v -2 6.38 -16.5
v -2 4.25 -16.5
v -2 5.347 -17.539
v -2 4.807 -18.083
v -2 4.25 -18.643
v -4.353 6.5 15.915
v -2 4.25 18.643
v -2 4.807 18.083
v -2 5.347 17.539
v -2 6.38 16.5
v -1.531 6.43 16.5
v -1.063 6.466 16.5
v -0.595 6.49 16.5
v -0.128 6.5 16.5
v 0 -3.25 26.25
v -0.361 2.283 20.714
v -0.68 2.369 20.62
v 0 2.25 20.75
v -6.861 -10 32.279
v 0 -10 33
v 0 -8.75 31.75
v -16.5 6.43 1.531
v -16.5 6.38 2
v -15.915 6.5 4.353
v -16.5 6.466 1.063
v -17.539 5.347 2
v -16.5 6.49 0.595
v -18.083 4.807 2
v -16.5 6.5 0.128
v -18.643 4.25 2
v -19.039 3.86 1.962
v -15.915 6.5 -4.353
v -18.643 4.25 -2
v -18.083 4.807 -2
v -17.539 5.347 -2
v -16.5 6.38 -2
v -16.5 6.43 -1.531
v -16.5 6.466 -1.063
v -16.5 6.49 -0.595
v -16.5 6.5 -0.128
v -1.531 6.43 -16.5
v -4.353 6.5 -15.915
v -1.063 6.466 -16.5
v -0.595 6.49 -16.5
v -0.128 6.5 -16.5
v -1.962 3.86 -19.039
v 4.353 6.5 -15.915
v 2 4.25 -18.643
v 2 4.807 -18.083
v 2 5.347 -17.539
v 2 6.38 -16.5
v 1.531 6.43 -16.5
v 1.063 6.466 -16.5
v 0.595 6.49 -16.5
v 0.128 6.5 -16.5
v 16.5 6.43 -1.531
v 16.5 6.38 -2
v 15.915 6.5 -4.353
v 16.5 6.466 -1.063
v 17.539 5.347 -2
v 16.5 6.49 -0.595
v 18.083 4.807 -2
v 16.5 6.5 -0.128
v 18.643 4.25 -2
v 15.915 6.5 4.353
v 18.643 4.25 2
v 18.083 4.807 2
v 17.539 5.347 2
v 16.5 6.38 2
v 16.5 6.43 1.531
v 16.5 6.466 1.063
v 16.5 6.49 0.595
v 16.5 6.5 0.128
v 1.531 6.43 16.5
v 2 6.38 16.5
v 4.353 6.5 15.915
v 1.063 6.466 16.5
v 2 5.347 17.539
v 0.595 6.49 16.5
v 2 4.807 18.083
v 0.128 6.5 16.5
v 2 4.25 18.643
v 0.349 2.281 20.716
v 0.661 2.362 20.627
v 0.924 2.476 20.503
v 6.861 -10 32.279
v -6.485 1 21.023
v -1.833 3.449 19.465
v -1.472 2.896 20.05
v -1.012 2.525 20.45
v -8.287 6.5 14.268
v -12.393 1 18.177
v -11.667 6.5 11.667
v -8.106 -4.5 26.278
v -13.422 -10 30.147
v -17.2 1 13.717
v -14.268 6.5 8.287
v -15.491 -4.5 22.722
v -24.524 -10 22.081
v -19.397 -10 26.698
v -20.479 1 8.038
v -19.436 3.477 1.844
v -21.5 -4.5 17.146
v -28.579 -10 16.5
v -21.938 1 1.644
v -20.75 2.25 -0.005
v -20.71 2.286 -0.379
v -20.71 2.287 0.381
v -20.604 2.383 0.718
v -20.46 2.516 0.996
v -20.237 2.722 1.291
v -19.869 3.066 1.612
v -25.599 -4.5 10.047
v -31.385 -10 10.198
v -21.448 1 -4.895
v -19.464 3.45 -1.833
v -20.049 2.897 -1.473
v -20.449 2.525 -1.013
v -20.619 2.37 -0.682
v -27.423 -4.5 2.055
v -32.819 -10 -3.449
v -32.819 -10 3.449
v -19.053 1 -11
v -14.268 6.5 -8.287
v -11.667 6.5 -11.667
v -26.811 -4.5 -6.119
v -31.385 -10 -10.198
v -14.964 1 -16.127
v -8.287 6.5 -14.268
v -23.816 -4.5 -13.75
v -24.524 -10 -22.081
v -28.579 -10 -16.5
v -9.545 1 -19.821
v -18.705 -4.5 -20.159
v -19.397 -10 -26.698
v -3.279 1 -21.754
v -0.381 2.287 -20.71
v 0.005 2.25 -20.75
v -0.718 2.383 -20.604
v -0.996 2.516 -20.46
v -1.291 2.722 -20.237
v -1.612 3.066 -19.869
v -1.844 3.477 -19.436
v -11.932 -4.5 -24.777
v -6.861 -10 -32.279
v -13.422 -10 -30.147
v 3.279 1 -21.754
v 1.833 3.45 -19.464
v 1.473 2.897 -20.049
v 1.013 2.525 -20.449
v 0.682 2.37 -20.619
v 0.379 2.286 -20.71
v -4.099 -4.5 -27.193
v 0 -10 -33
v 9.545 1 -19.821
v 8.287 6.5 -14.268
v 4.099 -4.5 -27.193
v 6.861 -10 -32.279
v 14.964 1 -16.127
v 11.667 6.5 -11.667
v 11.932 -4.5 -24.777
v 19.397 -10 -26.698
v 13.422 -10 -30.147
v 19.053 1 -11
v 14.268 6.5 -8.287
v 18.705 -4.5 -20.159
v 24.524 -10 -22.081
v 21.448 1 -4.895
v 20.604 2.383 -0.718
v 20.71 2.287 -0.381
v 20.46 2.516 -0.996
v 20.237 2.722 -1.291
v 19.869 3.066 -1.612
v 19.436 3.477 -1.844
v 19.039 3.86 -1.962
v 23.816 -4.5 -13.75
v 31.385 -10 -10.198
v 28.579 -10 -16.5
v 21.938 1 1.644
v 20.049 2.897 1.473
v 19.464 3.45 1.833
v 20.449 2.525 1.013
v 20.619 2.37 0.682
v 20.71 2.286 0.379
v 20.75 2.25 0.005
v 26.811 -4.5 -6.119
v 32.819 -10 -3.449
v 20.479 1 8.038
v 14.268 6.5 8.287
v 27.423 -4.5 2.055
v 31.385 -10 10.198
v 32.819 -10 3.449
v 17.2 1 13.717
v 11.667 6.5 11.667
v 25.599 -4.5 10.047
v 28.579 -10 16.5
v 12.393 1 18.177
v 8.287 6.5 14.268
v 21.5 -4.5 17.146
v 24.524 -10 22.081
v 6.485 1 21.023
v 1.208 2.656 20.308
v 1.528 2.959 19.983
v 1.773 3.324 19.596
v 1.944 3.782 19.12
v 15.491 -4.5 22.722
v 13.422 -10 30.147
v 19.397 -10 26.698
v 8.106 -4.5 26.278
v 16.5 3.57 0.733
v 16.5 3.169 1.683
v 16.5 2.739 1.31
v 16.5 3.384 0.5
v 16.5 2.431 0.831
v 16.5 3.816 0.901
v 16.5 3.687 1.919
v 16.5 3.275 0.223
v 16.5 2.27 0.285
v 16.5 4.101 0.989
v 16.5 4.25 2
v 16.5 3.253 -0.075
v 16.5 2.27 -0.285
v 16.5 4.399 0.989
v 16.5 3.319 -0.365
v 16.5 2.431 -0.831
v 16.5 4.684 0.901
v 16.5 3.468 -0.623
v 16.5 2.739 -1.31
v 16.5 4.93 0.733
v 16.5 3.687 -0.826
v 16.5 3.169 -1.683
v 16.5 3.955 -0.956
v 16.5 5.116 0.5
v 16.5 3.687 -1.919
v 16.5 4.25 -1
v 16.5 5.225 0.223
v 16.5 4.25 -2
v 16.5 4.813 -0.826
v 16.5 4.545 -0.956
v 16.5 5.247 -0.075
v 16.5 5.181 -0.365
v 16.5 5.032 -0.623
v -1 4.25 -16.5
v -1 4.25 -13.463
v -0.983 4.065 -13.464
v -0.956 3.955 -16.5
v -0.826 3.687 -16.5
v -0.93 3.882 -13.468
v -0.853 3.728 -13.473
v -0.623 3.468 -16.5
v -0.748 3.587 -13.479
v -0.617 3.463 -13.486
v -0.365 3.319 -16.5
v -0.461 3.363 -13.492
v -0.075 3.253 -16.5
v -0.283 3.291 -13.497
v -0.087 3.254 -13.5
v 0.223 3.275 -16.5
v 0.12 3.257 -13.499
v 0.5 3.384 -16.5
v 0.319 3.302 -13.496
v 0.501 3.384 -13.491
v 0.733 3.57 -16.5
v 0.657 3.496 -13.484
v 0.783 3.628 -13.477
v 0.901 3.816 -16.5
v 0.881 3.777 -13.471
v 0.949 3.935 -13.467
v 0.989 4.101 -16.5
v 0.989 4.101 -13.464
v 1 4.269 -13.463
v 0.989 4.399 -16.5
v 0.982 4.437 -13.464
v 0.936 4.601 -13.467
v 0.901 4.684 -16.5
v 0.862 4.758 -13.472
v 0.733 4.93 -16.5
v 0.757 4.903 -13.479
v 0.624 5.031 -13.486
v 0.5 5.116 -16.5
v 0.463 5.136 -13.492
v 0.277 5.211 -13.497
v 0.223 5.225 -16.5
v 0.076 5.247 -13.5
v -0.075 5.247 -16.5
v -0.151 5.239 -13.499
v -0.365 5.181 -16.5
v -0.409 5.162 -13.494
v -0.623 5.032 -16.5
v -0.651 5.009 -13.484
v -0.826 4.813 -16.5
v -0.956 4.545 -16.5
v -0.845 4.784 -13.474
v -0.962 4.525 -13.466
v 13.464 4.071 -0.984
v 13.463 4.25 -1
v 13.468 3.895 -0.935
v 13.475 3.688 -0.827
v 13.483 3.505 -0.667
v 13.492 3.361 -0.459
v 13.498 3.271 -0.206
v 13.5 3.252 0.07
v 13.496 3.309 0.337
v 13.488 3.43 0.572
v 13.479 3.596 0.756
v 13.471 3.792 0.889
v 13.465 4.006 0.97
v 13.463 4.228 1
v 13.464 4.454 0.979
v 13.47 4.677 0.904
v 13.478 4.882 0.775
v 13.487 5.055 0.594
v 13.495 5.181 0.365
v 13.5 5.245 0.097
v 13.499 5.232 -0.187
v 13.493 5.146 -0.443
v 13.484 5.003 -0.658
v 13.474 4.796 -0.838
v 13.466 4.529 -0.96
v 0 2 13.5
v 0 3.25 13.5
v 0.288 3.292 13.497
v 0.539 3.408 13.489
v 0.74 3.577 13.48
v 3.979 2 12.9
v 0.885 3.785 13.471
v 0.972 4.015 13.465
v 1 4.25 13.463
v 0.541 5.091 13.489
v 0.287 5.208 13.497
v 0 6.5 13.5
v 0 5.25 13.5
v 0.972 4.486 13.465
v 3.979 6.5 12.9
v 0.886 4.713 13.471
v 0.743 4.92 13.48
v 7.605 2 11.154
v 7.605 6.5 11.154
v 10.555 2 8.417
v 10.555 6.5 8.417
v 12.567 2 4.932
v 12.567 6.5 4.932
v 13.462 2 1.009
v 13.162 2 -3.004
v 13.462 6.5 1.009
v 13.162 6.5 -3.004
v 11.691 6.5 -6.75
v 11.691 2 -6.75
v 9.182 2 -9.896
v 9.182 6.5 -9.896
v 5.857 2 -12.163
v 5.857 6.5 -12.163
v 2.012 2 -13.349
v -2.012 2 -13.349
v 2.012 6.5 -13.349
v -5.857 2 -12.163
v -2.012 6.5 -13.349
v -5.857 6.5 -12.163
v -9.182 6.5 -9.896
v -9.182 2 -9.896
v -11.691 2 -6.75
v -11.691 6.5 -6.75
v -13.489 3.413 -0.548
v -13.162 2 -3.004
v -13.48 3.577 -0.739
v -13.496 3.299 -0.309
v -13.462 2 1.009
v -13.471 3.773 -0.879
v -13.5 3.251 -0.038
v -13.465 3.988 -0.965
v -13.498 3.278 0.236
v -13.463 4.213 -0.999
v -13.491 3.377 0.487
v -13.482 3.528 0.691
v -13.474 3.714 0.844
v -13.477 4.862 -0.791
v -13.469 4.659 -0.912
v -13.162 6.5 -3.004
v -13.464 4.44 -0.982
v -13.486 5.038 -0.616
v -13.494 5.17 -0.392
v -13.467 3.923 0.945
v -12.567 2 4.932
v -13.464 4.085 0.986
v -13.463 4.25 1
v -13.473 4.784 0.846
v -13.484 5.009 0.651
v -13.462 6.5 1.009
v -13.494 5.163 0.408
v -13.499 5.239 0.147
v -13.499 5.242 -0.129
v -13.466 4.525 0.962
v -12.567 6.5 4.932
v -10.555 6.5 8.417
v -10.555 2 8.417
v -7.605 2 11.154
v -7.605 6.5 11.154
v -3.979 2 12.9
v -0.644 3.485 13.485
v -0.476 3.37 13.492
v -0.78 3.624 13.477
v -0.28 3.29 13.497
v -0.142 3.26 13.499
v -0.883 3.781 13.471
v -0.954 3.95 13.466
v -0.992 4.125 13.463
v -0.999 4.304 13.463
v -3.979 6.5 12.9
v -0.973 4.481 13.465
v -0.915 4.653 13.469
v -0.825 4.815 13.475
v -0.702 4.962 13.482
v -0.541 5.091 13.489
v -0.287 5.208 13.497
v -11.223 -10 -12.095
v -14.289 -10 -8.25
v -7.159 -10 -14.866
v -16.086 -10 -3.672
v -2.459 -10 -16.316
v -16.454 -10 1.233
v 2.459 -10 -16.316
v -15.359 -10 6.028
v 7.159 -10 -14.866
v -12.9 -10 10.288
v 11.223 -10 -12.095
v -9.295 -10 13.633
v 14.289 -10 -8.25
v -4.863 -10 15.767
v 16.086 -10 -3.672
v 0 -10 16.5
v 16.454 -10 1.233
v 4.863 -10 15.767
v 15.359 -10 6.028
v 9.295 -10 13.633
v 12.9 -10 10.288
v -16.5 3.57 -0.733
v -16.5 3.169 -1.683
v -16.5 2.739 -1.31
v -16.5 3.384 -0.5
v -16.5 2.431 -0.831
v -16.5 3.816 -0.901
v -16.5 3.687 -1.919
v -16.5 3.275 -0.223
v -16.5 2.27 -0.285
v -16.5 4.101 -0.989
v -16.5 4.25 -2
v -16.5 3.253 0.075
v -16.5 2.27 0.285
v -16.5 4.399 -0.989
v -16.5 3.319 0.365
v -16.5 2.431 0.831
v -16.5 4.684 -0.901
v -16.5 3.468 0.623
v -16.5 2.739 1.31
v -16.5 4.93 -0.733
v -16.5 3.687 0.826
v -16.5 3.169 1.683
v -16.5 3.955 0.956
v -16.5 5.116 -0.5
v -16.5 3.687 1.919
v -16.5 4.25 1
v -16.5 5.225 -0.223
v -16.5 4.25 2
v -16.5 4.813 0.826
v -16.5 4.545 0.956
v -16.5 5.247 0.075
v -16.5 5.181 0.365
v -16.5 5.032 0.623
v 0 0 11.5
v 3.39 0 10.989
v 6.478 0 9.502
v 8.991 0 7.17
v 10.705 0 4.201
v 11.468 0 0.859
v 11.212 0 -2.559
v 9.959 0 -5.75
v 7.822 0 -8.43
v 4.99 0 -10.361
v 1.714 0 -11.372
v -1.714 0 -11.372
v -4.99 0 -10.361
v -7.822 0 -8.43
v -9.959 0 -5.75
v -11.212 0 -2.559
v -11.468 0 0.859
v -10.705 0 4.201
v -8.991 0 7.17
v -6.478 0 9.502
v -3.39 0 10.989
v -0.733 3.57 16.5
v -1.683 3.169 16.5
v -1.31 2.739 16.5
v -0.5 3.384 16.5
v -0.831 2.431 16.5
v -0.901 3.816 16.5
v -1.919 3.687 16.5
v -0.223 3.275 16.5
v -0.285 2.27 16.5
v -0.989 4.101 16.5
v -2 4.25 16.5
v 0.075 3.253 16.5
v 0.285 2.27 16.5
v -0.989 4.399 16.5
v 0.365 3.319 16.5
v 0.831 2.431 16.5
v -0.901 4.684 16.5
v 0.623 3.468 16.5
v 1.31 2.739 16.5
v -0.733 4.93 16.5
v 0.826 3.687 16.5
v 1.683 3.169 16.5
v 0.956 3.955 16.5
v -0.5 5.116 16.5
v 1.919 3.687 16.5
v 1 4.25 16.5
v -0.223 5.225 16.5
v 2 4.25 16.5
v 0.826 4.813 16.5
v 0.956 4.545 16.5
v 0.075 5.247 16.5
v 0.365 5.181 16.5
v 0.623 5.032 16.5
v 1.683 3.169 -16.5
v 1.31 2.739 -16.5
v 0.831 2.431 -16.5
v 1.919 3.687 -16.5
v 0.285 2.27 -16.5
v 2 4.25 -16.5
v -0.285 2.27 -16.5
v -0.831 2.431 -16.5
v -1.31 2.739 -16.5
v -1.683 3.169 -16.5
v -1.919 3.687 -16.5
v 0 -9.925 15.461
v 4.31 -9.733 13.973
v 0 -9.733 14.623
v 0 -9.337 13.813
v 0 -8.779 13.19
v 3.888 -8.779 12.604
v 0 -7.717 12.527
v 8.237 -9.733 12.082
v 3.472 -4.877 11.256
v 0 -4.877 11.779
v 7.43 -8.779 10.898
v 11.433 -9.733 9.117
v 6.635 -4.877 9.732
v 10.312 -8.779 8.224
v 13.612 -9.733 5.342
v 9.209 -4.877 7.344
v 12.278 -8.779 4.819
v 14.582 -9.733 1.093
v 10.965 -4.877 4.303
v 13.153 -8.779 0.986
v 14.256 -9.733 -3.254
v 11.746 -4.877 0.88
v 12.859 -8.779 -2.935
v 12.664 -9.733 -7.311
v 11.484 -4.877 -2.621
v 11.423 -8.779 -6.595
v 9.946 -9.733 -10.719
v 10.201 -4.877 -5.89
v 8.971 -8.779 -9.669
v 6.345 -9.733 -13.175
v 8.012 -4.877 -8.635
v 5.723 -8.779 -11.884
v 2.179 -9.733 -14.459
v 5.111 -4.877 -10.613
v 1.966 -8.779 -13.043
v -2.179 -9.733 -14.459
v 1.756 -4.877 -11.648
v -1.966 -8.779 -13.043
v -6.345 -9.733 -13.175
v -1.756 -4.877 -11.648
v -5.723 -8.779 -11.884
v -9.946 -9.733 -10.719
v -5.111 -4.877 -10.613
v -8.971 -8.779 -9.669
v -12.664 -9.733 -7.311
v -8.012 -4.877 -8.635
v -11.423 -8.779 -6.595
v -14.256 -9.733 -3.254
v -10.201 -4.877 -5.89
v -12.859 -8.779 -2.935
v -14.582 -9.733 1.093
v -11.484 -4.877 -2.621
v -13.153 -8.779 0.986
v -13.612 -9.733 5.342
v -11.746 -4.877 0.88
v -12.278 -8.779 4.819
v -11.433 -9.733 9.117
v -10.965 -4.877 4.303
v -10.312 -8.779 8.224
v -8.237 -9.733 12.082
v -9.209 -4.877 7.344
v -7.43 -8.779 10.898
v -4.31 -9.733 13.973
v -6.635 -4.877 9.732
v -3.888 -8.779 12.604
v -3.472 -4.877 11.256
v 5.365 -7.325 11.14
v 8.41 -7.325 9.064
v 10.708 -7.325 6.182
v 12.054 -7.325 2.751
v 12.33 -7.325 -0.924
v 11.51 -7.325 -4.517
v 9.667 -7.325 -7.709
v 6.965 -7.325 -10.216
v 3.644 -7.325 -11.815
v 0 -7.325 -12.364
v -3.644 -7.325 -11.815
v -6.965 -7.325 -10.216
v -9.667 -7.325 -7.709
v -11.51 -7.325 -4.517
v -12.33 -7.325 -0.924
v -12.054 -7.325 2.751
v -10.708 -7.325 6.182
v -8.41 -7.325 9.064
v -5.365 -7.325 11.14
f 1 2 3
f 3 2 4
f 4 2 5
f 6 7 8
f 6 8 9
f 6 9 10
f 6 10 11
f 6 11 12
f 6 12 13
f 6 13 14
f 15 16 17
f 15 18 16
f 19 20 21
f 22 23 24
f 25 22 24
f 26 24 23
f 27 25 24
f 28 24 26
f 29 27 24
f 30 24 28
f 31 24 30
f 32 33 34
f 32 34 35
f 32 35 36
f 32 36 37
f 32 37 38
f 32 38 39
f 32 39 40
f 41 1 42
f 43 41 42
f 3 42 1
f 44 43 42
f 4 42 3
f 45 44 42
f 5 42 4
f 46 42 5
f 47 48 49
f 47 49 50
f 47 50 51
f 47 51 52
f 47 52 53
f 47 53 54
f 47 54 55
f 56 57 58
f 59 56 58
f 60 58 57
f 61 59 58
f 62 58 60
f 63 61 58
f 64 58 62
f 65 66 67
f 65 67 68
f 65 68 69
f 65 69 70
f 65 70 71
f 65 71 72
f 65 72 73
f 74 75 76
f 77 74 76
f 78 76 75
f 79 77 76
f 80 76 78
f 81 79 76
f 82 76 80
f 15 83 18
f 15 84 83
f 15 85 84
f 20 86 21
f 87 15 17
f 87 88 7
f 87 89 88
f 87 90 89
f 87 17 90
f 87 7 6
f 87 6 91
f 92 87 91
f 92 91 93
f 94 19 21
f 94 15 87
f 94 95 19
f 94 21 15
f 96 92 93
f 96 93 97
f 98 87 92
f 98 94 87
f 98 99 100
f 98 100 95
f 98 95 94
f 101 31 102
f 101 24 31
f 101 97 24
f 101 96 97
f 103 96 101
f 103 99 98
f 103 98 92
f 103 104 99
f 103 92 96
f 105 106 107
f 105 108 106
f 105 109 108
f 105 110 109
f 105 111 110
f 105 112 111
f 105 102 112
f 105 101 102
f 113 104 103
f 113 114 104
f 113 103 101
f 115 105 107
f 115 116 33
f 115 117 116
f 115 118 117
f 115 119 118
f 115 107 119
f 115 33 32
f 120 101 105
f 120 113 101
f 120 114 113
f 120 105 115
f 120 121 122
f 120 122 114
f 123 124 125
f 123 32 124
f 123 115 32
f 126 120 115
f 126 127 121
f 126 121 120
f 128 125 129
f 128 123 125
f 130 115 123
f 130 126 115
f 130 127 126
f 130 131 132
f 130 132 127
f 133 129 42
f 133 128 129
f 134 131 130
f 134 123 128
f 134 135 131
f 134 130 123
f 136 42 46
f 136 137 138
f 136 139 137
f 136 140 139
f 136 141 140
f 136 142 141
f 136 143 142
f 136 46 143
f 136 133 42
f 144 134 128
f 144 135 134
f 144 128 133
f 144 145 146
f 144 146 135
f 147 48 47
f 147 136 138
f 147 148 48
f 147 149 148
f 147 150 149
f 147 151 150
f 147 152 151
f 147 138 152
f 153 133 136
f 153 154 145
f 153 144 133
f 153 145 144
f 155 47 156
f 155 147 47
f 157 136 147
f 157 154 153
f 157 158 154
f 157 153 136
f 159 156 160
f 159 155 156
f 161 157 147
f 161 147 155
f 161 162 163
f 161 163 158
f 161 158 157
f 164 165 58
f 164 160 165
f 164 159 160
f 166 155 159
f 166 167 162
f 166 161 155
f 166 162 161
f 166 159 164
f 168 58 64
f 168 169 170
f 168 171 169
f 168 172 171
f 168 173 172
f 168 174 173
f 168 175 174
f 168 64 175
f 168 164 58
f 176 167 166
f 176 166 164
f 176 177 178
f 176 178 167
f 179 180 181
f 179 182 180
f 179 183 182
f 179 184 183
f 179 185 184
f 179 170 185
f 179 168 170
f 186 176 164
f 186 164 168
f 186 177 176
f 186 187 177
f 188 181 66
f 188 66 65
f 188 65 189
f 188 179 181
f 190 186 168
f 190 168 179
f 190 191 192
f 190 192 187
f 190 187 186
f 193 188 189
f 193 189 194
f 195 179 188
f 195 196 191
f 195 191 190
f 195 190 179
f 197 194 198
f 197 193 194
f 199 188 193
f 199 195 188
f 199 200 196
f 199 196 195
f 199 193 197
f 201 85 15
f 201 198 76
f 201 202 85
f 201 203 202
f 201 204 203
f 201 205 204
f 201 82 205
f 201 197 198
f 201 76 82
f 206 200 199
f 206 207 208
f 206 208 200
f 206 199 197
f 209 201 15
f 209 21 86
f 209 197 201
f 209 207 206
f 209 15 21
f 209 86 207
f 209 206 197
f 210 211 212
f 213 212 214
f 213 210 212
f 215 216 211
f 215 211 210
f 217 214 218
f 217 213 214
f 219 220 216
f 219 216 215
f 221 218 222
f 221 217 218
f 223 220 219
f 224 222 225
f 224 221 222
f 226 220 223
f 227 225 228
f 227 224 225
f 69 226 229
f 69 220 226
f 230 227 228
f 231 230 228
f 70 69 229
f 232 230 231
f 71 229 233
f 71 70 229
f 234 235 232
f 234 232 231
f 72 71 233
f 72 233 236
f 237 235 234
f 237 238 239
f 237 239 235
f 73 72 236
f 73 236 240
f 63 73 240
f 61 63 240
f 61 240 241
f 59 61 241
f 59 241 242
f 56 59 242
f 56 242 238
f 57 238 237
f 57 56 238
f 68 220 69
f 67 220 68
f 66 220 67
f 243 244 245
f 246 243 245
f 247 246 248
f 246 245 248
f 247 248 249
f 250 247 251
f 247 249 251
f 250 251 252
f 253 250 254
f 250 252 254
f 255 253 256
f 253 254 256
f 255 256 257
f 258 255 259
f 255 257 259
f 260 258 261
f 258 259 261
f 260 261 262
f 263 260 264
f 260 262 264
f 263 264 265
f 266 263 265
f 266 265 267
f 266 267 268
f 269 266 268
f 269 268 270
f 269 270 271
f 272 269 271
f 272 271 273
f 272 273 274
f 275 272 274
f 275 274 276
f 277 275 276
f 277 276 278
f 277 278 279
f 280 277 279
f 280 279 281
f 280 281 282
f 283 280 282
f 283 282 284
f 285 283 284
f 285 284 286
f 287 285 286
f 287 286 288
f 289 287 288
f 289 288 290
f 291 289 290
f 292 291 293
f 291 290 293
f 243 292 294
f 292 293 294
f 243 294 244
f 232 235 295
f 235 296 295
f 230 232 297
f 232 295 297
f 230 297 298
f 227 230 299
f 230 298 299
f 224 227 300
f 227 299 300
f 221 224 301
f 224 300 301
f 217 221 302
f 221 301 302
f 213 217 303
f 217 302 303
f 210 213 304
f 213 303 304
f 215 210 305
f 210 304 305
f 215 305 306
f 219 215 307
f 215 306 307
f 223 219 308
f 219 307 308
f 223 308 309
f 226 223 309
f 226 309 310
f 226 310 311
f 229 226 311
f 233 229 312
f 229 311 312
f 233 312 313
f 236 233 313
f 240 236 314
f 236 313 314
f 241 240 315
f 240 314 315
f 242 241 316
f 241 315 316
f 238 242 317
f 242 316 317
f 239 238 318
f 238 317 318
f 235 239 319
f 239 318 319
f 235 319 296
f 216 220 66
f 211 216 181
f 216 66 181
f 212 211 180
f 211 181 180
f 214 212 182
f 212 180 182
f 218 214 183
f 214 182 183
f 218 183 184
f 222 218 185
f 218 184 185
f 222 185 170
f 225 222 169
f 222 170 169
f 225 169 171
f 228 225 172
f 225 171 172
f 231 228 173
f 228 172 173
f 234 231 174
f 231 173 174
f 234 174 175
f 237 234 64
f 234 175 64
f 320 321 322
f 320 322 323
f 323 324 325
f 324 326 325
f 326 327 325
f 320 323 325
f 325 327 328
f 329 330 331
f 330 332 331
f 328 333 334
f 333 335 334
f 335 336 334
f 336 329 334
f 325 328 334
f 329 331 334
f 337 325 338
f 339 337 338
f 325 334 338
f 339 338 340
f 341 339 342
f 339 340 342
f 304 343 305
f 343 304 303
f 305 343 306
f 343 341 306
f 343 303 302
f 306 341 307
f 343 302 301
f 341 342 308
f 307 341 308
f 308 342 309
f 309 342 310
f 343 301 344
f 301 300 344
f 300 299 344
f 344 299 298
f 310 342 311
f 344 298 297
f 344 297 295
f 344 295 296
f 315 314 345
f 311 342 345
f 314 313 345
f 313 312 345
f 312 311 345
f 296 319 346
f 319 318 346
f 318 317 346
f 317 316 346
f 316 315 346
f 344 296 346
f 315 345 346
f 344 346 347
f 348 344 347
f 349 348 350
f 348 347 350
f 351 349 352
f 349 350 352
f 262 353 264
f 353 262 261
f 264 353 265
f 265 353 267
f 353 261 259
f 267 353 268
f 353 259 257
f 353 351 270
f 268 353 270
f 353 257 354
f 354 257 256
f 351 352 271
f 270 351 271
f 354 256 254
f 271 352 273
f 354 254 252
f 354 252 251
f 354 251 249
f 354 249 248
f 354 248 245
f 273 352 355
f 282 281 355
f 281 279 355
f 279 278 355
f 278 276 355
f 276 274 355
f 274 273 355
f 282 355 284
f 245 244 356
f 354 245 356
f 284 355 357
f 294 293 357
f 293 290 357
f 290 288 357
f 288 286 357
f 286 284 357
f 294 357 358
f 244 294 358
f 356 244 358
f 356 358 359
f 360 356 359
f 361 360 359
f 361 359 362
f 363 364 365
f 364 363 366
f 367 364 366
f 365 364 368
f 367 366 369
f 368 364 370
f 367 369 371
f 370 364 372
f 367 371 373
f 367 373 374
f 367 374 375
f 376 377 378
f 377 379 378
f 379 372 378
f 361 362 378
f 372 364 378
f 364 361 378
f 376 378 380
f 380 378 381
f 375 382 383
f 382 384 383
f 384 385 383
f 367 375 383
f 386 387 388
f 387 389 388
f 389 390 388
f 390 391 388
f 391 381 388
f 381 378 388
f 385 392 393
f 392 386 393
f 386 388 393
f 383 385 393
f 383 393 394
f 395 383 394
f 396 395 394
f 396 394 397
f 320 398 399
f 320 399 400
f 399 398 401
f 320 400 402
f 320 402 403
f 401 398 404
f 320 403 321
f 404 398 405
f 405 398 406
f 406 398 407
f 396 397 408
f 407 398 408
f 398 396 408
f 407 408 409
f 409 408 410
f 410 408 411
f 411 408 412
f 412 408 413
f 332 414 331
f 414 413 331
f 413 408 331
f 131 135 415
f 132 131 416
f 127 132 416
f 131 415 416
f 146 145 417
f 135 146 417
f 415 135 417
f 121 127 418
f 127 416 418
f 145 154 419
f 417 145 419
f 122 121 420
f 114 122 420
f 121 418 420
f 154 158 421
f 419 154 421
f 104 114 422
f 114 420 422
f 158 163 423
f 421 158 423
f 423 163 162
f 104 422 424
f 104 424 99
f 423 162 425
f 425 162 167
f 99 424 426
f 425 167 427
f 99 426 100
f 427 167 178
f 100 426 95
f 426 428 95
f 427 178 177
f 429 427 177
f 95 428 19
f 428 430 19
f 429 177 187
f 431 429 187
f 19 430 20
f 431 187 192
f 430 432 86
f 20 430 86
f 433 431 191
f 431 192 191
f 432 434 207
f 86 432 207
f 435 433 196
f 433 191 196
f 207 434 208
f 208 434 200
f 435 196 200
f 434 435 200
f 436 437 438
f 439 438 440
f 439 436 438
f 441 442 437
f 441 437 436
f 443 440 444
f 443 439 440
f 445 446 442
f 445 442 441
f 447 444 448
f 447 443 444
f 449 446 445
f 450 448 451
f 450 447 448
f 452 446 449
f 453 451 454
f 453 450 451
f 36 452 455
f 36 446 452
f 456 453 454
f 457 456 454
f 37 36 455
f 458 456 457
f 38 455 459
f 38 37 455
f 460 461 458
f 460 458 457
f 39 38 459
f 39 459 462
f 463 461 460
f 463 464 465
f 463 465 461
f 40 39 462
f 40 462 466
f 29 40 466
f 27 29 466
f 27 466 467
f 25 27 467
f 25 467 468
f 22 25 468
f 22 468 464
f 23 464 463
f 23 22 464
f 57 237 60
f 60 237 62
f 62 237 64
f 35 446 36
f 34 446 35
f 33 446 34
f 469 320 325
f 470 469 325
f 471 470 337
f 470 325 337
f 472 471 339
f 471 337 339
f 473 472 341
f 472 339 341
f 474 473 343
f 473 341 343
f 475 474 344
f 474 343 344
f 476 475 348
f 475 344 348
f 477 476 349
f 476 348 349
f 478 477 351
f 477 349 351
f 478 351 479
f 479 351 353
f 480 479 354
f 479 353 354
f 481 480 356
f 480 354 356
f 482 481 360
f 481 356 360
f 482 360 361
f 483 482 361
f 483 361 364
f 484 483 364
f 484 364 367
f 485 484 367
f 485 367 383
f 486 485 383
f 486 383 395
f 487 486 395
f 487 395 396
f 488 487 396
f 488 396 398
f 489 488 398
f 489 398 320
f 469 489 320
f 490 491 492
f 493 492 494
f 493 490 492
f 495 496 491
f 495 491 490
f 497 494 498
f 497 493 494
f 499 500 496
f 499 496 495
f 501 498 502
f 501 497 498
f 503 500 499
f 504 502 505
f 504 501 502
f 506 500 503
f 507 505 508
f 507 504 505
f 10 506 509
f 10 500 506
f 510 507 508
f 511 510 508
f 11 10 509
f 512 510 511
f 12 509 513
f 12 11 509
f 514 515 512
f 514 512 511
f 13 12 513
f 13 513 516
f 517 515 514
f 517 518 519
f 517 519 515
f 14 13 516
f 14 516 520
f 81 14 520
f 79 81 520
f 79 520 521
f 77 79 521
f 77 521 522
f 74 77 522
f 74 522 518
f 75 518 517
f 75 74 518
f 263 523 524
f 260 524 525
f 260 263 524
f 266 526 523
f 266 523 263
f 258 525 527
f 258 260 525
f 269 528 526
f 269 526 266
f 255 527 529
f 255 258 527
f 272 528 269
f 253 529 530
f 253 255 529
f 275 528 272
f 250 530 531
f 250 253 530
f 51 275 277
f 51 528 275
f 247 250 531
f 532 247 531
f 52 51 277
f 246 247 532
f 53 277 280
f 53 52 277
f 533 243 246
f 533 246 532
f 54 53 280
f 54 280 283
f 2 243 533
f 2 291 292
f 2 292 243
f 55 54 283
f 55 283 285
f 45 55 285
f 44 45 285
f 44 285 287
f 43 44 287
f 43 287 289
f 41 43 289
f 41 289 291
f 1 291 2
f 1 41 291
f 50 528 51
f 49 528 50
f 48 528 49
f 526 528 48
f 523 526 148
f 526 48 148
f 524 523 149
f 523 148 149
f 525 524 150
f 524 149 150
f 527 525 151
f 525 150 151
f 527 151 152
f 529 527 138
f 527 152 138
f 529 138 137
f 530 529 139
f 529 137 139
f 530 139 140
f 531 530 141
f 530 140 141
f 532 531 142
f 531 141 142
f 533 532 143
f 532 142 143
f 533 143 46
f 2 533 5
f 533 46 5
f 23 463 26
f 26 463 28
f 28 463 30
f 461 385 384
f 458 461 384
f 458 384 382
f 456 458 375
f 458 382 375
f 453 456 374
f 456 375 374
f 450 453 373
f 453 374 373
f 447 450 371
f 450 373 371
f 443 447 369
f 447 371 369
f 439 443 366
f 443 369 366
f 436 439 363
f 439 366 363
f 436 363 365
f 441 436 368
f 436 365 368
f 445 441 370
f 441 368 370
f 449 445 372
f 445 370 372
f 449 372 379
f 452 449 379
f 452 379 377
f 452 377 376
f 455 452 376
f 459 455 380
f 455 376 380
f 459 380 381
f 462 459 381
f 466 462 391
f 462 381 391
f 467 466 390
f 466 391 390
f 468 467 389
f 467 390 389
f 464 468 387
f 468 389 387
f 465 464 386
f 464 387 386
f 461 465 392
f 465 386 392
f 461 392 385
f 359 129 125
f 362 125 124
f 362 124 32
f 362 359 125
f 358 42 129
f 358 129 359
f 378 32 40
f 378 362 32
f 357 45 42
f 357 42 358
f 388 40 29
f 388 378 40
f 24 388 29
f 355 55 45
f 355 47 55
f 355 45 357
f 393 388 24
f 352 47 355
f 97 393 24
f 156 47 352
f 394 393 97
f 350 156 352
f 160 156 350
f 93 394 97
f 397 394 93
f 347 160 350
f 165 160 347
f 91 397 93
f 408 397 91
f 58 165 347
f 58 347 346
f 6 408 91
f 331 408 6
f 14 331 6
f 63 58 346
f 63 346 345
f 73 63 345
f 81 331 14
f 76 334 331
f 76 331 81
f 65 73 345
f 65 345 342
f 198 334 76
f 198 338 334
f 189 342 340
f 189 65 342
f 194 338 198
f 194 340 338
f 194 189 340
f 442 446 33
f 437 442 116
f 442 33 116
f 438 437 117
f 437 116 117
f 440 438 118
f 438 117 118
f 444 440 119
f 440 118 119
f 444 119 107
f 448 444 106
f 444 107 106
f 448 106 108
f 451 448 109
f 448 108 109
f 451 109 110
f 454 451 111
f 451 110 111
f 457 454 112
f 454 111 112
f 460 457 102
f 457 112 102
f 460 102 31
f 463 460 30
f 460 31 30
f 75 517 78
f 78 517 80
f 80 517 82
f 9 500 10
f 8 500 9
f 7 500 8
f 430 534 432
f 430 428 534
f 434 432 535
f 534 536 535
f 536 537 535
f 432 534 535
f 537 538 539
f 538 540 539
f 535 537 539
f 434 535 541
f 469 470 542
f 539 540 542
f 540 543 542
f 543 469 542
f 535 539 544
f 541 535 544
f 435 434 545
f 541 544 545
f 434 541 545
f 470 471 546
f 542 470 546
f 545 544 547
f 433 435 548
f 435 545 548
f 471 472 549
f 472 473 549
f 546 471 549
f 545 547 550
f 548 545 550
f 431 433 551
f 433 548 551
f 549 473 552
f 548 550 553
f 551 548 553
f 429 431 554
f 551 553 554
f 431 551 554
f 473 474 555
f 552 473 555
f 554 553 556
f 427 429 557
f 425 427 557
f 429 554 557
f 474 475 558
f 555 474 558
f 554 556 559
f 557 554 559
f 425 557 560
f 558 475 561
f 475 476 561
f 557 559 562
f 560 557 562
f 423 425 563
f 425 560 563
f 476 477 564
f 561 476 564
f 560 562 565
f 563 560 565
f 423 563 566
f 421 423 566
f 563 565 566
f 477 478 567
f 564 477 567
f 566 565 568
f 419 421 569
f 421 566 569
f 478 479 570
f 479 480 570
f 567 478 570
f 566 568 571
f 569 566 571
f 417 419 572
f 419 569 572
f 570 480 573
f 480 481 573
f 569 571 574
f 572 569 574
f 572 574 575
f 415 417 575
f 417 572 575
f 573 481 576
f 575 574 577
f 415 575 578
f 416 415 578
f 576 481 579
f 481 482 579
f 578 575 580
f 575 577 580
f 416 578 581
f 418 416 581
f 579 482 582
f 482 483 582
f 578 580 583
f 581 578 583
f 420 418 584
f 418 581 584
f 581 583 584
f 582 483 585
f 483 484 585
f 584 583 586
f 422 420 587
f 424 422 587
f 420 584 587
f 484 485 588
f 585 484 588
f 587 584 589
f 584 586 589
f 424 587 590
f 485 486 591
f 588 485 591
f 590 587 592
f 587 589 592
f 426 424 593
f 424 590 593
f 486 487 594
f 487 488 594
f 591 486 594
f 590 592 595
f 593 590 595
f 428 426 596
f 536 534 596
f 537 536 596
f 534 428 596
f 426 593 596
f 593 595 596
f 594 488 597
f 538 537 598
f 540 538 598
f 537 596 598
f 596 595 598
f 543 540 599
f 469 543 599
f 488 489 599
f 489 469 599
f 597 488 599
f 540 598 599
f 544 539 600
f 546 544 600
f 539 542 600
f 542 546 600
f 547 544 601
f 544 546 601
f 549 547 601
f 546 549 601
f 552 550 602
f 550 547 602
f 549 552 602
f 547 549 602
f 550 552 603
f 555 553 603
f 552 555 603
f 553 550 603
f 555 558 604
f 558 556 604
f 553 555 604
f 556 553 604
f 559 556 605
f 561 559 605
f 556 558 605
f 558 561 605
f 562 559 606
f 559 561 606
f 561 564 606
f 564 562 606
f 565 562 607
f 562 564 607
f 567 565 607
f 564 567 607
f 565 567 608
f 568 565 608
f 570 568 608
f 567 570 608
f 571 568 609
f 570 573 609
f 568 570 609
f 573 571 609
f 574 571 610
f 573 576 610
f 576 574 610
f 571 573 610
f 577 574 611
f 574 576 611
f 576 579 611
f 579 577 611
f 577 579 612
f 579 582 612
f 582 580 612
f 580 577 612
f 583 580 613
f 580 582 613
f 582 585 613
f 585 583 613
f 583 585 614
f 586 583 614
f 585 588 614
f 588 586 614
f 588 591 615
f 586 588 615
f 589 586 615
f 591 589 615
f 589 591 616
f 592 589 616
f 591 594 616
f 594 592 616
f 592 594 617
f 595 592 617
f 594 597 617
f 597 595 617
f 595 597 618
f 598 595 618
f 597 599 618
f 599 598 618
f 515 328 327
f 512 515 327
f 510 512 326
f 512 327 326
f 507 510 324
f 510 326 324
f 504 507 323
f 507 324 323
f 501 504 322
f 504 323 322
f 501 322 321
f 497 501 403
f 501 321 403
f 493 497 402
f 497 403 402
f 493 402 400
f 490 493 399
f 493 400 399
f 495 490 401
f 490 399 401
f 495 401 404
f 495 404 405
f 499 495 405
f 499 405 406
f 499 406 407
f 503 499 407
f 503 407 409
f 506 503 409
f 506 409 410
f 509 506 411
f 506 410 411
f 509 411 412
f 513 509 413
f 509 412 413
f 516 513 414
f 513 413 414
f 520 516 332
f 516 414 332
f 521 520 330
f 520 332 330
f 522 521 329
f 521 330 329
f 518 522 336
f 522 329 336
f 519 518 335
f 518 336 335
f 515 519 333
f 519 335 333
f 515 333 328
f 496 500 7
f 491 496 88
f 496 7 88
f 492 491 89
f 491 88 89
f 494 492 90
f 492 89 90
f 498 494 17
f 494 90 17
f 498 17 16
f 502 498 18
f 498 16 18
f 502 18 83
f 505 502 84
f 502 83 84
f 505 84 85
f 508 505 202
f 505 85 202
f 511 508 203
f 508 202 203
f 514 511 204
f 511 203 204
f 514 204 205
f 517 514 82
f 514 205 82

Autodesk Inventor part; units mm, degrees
ref_plane "YZ Plane" through (0, 0, 0) normal (1, 0, 0) x (0, 1, 0)
ref_plane "XZ Plane" through (0, 0, 0) normal (0, 1, 0) x (-1, 0, 0)
sketch "Эскиз1" plane through (0, 0, 0) normal (1, 0, 0) x (0, 1, 0)
  line L0 (0, 0) -> (0, 11.5)
  line L1 (0, 11.5) -> (0, 13.5)
  line L2 (0, 13.5) -> (2, 13.5)
  line L3 (2, 13.5) -> (0, 11.5)
  line L4 (2, 13.5) -> (6.5, 13.5)
  line L5 (6.5, 13.5) -> (6.5, 16.5)
  line L6 (6.5, 16.5) -> (2, 16.5)
  line L7 (0, 13.5) -> (0, 16.5)
  line L8 (0, 16.5) -> (2, 16.5)
  line L9 (6.5, 16.5) -> (-10, 33)
  line L10 (6.5, 16.5) -> (32.9156, 16.5) construction
  line L11 (0, 33) -> (-10, 33)
  line L12 (-10, 33) -> (-10, 16.5)
  line L13 (-10, 16.5) -> (-9.9702, 14.7974) construction
  line L14 (-9.9702, 14.7974) -> (-9.629, 12.8623) construction
  line L15 (-9.629, 12.8623) -> (-8.0037, 11.5) construction
  line L16 (-8.0037, 11.5) -> (0, 11.5) construction
  spline S0 degree 4 poles (-10, 16.5) (-9.9702, 14.7974) (-9.629, 12.8623) (-8.0037, 11.5) (0, 11.5) knots 1 1 1 1 1 2 2 2 2 2
  line L17 (0, 0) -> (14.3588, 0)
  dimension "d1" = 2
  dimension "d2" = 2
  dimension "d3" = 13.5
  dimension "d4" = 3
  dimension "d5" = 4.5
  dimension "d6" = 16.5
  dimension "d7" = 135
revolve "Вращение1" add sketch "Эскиз1" angle 360 about axis through (0, 0, 0) along (0, 1, 0)
sketch "Эскиз2" plane through (0, 0, 0) normal (0, 0, 1) x (1, 0, 0)
  line L0 (13.5, 6.5) -> (-13.5, 6.5) projected
  line L1 (13.5, 2) -> (-13.5, 2) projected
  line L2 (0, 2) -> (0, 6.5)
  circle A0 centre (0, 4.25) radius 1
  point P0 (0, 0)
  dimension "d9" = 2
extrude "Выдавливание1" cut sketch "Эскиз2" along normal blind 30
ref_plane "РабПлоскость1" through (0, 0, 36.5125) normal (0, 0, 1) x (1, 0, 0)
sketch "Эскиз3" plane through (0, 0, 36.5125) normal (0, 0, 1) x (1, 0, 0)
  line L0 (16.5, 6.5) -> (-16.5, 6.5) projected
  arc A0 (-2, 4.25) -> (2, 4.25) centre (0, 4.25) ccw
  line L1 (-2, 4.25) -> (-2, 6.5)
  line L2 (2, 4.25) -> (2, 6.5)
  point P0 (0, 0)
  point P1 (0.9986, 4.3033)
  dimension "d14" = 4
extrude "Выдавливание2" cut sketch "Эскиз3" against normal blind 20.013
pattern_circular "Круговой массив1" count 4 over 360 about axis through (0, 4.25, 0) along (0, 1, 0) of "Выдавливание2", "Выдавливание1"
properties part number "Статор без зубьев"
